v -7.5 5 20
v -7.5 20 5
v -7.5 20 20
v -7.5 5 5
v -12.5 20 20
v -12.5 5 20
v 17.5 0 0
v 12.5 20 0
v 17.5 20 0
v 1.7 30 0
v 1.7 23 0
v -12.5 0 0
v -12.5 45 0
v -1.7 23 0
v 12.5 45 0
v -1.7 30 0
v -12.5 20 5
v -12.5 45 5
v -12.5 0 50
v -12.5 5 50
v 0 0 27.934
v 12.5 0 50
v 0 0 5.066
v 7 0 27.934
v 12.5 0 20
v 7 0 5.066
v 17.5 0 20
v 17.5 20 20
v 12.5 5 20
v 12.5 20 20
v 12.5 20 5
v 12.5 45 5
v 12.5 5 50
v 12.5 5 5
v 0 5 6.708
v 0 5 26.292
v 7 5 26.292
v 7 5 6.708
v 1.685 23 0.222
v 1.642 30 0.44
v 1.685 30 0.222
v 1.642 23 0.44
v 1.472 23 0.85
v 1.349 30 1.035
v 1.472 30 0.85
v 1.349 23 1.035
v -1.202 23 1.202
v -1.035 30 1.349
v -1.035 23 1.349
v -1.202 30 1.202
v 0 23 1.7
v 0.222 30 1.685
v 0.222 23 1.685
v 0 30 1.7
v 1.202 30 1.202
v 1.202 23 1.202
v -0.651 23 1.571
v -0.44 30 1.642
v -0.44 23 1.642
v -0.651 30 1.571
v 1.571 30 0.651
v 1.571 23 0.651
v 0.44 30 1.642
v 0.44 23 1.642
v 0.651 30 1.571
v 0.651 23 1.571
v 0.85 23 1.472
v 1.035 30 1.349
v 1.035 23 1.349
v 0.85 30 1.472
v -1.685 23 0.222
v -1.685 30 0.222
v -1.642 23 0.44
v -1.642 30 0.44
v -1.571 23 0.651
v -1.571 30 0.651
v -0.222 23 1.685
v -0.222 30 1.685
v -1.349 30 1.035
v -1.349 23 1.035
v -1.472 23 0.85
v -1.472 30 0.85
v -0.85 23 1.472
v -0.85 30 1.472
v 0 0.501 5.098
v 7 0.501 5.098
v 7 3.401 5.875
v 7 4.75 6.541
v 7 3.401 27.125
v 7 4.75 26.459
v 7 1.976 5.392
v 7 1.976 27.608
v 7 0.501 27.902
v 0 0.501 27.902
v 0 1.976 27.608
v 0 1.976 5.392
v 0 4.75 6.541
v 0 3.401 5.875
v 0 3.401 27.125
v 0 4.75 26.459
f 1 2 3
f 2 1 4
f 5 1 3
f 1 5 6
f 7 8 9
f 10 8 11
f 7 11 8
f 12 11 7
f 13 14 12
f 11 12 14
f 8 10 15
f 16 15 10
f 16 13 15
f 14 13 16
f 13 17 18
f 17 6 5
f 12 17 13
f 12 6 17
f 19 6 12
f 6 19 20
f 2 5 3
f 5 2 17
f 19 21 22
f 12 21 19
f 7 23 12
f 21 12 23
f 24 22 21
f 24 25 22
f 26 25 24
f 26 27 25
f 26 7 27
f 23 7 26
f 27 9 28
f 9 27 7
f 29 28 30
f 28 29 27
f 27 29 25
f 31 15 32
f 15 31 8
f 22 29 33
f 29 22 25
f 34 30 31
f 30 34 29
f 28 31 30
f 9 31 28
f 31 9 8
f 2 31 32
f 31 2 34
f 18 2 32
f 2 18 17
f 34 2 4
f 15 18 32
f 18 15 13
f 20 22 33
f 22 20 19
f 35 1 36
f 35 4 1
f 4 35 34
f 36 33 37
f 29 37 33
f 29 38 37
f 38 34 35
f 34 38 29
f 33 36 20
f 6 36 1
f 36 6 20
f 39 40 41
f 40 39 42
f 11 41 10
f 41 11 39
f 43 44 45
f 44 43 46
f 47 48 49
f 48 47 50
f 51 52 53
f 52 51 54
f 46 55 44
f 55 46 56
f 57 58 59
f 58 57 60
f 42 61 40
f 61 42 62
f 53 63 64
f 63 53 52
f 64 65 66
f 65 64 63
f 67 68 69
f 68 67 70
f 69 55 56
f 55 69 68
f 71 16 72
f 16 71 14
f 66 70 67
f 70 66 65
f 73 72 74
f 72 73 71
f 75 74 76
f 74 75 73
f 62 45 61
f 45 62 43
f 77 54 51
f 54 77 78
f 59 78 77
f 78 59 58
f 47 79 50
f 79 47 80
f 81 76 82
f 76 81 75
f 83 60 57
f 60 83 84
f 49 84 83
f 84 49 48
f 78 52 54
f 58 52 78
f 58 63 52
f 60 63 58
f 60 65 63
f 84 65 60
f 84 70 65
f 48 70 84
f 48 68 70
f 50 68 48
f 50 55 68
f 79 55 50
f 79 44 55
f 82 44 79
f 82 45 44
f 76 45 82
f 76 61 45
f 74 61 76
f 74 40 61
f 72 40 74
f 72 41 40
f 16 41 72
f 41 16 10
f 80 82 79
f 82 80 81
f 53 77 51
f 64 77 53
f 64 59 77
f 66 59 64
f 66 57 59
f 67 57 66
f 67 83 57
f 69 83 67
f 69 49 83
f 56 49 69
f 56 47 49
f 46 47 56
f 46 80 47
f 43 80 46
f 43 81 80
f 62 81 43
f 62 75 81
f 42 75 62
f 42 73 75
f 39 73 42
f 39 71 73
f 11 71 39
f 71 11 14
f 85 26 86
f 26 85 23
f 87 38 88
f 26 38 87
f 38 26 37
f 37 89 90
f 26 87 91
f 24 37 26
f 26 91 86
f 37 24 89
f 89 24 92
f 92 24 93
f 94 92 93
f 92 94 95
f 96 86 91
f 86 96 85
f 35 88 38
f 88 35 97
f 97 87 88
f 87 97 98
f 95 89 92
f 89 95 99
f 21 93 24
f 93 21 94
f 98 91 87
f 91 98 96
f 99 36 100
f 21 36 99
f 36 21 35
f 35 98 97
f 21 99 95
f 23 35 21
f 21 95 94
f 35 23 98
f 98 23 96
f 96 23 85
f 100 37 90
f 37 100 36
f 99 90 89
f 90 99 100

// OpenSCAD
// L-shaped mounting bracket for a NEMA 17 stepper motor (e.g. syringe pump).
// Base plate with two vertical through-holes; motor plate standing on its back edge with a
// centring boss hole and a screw pattern; two triangular gussets flush with the edges.
//

base_x  = 25;
base_y  = 45;
base_z  = 5;
screw_h = 4.5;
screw_x = [-17, 17];
screw_y = 30;

motor_x = 25;
motor_y = 5;
motor_z = 50;
boss_h  = 23;
boss_x  = 0;
boss_z  = 28;
screw_s = 31;
screw_m = 3.4;

$fn = 48;

gusset_t = 5;
gusset_y = 20;
gusset_z = 20;

difference() {
    union() {
        translate([-base_x / 2, 0, 0]) cube([base_x, base_y, base_z]);
        translate([-motor_x / 2, 0, 0]) cube([motor_x, motor_y, motor_z]);
        for (x = [-base_x / 2, base_x / 2])
            translate([x, 0, 0]) cube([gusset_t, gusset_y, gusset_z]);
    }
    for (x = screw_x)
        translate([x, screw_y, -1]) cylinder(h = base_z + 2, d = screw_h);
    translate([0, -1, boss_z - boss_h / 2]) rotate([0, 90, 0]) cylinder(h = motor_y + 2, d = boss_h);
    for (i = [0, 1])
        for (j = [0, 1])
            translate([j * screw_s / 2, screw_y, i * screw_s / 2])
                rotate([90, 0, 0]) cylinder(h = motor_y + 2, d = screw_m);
}
